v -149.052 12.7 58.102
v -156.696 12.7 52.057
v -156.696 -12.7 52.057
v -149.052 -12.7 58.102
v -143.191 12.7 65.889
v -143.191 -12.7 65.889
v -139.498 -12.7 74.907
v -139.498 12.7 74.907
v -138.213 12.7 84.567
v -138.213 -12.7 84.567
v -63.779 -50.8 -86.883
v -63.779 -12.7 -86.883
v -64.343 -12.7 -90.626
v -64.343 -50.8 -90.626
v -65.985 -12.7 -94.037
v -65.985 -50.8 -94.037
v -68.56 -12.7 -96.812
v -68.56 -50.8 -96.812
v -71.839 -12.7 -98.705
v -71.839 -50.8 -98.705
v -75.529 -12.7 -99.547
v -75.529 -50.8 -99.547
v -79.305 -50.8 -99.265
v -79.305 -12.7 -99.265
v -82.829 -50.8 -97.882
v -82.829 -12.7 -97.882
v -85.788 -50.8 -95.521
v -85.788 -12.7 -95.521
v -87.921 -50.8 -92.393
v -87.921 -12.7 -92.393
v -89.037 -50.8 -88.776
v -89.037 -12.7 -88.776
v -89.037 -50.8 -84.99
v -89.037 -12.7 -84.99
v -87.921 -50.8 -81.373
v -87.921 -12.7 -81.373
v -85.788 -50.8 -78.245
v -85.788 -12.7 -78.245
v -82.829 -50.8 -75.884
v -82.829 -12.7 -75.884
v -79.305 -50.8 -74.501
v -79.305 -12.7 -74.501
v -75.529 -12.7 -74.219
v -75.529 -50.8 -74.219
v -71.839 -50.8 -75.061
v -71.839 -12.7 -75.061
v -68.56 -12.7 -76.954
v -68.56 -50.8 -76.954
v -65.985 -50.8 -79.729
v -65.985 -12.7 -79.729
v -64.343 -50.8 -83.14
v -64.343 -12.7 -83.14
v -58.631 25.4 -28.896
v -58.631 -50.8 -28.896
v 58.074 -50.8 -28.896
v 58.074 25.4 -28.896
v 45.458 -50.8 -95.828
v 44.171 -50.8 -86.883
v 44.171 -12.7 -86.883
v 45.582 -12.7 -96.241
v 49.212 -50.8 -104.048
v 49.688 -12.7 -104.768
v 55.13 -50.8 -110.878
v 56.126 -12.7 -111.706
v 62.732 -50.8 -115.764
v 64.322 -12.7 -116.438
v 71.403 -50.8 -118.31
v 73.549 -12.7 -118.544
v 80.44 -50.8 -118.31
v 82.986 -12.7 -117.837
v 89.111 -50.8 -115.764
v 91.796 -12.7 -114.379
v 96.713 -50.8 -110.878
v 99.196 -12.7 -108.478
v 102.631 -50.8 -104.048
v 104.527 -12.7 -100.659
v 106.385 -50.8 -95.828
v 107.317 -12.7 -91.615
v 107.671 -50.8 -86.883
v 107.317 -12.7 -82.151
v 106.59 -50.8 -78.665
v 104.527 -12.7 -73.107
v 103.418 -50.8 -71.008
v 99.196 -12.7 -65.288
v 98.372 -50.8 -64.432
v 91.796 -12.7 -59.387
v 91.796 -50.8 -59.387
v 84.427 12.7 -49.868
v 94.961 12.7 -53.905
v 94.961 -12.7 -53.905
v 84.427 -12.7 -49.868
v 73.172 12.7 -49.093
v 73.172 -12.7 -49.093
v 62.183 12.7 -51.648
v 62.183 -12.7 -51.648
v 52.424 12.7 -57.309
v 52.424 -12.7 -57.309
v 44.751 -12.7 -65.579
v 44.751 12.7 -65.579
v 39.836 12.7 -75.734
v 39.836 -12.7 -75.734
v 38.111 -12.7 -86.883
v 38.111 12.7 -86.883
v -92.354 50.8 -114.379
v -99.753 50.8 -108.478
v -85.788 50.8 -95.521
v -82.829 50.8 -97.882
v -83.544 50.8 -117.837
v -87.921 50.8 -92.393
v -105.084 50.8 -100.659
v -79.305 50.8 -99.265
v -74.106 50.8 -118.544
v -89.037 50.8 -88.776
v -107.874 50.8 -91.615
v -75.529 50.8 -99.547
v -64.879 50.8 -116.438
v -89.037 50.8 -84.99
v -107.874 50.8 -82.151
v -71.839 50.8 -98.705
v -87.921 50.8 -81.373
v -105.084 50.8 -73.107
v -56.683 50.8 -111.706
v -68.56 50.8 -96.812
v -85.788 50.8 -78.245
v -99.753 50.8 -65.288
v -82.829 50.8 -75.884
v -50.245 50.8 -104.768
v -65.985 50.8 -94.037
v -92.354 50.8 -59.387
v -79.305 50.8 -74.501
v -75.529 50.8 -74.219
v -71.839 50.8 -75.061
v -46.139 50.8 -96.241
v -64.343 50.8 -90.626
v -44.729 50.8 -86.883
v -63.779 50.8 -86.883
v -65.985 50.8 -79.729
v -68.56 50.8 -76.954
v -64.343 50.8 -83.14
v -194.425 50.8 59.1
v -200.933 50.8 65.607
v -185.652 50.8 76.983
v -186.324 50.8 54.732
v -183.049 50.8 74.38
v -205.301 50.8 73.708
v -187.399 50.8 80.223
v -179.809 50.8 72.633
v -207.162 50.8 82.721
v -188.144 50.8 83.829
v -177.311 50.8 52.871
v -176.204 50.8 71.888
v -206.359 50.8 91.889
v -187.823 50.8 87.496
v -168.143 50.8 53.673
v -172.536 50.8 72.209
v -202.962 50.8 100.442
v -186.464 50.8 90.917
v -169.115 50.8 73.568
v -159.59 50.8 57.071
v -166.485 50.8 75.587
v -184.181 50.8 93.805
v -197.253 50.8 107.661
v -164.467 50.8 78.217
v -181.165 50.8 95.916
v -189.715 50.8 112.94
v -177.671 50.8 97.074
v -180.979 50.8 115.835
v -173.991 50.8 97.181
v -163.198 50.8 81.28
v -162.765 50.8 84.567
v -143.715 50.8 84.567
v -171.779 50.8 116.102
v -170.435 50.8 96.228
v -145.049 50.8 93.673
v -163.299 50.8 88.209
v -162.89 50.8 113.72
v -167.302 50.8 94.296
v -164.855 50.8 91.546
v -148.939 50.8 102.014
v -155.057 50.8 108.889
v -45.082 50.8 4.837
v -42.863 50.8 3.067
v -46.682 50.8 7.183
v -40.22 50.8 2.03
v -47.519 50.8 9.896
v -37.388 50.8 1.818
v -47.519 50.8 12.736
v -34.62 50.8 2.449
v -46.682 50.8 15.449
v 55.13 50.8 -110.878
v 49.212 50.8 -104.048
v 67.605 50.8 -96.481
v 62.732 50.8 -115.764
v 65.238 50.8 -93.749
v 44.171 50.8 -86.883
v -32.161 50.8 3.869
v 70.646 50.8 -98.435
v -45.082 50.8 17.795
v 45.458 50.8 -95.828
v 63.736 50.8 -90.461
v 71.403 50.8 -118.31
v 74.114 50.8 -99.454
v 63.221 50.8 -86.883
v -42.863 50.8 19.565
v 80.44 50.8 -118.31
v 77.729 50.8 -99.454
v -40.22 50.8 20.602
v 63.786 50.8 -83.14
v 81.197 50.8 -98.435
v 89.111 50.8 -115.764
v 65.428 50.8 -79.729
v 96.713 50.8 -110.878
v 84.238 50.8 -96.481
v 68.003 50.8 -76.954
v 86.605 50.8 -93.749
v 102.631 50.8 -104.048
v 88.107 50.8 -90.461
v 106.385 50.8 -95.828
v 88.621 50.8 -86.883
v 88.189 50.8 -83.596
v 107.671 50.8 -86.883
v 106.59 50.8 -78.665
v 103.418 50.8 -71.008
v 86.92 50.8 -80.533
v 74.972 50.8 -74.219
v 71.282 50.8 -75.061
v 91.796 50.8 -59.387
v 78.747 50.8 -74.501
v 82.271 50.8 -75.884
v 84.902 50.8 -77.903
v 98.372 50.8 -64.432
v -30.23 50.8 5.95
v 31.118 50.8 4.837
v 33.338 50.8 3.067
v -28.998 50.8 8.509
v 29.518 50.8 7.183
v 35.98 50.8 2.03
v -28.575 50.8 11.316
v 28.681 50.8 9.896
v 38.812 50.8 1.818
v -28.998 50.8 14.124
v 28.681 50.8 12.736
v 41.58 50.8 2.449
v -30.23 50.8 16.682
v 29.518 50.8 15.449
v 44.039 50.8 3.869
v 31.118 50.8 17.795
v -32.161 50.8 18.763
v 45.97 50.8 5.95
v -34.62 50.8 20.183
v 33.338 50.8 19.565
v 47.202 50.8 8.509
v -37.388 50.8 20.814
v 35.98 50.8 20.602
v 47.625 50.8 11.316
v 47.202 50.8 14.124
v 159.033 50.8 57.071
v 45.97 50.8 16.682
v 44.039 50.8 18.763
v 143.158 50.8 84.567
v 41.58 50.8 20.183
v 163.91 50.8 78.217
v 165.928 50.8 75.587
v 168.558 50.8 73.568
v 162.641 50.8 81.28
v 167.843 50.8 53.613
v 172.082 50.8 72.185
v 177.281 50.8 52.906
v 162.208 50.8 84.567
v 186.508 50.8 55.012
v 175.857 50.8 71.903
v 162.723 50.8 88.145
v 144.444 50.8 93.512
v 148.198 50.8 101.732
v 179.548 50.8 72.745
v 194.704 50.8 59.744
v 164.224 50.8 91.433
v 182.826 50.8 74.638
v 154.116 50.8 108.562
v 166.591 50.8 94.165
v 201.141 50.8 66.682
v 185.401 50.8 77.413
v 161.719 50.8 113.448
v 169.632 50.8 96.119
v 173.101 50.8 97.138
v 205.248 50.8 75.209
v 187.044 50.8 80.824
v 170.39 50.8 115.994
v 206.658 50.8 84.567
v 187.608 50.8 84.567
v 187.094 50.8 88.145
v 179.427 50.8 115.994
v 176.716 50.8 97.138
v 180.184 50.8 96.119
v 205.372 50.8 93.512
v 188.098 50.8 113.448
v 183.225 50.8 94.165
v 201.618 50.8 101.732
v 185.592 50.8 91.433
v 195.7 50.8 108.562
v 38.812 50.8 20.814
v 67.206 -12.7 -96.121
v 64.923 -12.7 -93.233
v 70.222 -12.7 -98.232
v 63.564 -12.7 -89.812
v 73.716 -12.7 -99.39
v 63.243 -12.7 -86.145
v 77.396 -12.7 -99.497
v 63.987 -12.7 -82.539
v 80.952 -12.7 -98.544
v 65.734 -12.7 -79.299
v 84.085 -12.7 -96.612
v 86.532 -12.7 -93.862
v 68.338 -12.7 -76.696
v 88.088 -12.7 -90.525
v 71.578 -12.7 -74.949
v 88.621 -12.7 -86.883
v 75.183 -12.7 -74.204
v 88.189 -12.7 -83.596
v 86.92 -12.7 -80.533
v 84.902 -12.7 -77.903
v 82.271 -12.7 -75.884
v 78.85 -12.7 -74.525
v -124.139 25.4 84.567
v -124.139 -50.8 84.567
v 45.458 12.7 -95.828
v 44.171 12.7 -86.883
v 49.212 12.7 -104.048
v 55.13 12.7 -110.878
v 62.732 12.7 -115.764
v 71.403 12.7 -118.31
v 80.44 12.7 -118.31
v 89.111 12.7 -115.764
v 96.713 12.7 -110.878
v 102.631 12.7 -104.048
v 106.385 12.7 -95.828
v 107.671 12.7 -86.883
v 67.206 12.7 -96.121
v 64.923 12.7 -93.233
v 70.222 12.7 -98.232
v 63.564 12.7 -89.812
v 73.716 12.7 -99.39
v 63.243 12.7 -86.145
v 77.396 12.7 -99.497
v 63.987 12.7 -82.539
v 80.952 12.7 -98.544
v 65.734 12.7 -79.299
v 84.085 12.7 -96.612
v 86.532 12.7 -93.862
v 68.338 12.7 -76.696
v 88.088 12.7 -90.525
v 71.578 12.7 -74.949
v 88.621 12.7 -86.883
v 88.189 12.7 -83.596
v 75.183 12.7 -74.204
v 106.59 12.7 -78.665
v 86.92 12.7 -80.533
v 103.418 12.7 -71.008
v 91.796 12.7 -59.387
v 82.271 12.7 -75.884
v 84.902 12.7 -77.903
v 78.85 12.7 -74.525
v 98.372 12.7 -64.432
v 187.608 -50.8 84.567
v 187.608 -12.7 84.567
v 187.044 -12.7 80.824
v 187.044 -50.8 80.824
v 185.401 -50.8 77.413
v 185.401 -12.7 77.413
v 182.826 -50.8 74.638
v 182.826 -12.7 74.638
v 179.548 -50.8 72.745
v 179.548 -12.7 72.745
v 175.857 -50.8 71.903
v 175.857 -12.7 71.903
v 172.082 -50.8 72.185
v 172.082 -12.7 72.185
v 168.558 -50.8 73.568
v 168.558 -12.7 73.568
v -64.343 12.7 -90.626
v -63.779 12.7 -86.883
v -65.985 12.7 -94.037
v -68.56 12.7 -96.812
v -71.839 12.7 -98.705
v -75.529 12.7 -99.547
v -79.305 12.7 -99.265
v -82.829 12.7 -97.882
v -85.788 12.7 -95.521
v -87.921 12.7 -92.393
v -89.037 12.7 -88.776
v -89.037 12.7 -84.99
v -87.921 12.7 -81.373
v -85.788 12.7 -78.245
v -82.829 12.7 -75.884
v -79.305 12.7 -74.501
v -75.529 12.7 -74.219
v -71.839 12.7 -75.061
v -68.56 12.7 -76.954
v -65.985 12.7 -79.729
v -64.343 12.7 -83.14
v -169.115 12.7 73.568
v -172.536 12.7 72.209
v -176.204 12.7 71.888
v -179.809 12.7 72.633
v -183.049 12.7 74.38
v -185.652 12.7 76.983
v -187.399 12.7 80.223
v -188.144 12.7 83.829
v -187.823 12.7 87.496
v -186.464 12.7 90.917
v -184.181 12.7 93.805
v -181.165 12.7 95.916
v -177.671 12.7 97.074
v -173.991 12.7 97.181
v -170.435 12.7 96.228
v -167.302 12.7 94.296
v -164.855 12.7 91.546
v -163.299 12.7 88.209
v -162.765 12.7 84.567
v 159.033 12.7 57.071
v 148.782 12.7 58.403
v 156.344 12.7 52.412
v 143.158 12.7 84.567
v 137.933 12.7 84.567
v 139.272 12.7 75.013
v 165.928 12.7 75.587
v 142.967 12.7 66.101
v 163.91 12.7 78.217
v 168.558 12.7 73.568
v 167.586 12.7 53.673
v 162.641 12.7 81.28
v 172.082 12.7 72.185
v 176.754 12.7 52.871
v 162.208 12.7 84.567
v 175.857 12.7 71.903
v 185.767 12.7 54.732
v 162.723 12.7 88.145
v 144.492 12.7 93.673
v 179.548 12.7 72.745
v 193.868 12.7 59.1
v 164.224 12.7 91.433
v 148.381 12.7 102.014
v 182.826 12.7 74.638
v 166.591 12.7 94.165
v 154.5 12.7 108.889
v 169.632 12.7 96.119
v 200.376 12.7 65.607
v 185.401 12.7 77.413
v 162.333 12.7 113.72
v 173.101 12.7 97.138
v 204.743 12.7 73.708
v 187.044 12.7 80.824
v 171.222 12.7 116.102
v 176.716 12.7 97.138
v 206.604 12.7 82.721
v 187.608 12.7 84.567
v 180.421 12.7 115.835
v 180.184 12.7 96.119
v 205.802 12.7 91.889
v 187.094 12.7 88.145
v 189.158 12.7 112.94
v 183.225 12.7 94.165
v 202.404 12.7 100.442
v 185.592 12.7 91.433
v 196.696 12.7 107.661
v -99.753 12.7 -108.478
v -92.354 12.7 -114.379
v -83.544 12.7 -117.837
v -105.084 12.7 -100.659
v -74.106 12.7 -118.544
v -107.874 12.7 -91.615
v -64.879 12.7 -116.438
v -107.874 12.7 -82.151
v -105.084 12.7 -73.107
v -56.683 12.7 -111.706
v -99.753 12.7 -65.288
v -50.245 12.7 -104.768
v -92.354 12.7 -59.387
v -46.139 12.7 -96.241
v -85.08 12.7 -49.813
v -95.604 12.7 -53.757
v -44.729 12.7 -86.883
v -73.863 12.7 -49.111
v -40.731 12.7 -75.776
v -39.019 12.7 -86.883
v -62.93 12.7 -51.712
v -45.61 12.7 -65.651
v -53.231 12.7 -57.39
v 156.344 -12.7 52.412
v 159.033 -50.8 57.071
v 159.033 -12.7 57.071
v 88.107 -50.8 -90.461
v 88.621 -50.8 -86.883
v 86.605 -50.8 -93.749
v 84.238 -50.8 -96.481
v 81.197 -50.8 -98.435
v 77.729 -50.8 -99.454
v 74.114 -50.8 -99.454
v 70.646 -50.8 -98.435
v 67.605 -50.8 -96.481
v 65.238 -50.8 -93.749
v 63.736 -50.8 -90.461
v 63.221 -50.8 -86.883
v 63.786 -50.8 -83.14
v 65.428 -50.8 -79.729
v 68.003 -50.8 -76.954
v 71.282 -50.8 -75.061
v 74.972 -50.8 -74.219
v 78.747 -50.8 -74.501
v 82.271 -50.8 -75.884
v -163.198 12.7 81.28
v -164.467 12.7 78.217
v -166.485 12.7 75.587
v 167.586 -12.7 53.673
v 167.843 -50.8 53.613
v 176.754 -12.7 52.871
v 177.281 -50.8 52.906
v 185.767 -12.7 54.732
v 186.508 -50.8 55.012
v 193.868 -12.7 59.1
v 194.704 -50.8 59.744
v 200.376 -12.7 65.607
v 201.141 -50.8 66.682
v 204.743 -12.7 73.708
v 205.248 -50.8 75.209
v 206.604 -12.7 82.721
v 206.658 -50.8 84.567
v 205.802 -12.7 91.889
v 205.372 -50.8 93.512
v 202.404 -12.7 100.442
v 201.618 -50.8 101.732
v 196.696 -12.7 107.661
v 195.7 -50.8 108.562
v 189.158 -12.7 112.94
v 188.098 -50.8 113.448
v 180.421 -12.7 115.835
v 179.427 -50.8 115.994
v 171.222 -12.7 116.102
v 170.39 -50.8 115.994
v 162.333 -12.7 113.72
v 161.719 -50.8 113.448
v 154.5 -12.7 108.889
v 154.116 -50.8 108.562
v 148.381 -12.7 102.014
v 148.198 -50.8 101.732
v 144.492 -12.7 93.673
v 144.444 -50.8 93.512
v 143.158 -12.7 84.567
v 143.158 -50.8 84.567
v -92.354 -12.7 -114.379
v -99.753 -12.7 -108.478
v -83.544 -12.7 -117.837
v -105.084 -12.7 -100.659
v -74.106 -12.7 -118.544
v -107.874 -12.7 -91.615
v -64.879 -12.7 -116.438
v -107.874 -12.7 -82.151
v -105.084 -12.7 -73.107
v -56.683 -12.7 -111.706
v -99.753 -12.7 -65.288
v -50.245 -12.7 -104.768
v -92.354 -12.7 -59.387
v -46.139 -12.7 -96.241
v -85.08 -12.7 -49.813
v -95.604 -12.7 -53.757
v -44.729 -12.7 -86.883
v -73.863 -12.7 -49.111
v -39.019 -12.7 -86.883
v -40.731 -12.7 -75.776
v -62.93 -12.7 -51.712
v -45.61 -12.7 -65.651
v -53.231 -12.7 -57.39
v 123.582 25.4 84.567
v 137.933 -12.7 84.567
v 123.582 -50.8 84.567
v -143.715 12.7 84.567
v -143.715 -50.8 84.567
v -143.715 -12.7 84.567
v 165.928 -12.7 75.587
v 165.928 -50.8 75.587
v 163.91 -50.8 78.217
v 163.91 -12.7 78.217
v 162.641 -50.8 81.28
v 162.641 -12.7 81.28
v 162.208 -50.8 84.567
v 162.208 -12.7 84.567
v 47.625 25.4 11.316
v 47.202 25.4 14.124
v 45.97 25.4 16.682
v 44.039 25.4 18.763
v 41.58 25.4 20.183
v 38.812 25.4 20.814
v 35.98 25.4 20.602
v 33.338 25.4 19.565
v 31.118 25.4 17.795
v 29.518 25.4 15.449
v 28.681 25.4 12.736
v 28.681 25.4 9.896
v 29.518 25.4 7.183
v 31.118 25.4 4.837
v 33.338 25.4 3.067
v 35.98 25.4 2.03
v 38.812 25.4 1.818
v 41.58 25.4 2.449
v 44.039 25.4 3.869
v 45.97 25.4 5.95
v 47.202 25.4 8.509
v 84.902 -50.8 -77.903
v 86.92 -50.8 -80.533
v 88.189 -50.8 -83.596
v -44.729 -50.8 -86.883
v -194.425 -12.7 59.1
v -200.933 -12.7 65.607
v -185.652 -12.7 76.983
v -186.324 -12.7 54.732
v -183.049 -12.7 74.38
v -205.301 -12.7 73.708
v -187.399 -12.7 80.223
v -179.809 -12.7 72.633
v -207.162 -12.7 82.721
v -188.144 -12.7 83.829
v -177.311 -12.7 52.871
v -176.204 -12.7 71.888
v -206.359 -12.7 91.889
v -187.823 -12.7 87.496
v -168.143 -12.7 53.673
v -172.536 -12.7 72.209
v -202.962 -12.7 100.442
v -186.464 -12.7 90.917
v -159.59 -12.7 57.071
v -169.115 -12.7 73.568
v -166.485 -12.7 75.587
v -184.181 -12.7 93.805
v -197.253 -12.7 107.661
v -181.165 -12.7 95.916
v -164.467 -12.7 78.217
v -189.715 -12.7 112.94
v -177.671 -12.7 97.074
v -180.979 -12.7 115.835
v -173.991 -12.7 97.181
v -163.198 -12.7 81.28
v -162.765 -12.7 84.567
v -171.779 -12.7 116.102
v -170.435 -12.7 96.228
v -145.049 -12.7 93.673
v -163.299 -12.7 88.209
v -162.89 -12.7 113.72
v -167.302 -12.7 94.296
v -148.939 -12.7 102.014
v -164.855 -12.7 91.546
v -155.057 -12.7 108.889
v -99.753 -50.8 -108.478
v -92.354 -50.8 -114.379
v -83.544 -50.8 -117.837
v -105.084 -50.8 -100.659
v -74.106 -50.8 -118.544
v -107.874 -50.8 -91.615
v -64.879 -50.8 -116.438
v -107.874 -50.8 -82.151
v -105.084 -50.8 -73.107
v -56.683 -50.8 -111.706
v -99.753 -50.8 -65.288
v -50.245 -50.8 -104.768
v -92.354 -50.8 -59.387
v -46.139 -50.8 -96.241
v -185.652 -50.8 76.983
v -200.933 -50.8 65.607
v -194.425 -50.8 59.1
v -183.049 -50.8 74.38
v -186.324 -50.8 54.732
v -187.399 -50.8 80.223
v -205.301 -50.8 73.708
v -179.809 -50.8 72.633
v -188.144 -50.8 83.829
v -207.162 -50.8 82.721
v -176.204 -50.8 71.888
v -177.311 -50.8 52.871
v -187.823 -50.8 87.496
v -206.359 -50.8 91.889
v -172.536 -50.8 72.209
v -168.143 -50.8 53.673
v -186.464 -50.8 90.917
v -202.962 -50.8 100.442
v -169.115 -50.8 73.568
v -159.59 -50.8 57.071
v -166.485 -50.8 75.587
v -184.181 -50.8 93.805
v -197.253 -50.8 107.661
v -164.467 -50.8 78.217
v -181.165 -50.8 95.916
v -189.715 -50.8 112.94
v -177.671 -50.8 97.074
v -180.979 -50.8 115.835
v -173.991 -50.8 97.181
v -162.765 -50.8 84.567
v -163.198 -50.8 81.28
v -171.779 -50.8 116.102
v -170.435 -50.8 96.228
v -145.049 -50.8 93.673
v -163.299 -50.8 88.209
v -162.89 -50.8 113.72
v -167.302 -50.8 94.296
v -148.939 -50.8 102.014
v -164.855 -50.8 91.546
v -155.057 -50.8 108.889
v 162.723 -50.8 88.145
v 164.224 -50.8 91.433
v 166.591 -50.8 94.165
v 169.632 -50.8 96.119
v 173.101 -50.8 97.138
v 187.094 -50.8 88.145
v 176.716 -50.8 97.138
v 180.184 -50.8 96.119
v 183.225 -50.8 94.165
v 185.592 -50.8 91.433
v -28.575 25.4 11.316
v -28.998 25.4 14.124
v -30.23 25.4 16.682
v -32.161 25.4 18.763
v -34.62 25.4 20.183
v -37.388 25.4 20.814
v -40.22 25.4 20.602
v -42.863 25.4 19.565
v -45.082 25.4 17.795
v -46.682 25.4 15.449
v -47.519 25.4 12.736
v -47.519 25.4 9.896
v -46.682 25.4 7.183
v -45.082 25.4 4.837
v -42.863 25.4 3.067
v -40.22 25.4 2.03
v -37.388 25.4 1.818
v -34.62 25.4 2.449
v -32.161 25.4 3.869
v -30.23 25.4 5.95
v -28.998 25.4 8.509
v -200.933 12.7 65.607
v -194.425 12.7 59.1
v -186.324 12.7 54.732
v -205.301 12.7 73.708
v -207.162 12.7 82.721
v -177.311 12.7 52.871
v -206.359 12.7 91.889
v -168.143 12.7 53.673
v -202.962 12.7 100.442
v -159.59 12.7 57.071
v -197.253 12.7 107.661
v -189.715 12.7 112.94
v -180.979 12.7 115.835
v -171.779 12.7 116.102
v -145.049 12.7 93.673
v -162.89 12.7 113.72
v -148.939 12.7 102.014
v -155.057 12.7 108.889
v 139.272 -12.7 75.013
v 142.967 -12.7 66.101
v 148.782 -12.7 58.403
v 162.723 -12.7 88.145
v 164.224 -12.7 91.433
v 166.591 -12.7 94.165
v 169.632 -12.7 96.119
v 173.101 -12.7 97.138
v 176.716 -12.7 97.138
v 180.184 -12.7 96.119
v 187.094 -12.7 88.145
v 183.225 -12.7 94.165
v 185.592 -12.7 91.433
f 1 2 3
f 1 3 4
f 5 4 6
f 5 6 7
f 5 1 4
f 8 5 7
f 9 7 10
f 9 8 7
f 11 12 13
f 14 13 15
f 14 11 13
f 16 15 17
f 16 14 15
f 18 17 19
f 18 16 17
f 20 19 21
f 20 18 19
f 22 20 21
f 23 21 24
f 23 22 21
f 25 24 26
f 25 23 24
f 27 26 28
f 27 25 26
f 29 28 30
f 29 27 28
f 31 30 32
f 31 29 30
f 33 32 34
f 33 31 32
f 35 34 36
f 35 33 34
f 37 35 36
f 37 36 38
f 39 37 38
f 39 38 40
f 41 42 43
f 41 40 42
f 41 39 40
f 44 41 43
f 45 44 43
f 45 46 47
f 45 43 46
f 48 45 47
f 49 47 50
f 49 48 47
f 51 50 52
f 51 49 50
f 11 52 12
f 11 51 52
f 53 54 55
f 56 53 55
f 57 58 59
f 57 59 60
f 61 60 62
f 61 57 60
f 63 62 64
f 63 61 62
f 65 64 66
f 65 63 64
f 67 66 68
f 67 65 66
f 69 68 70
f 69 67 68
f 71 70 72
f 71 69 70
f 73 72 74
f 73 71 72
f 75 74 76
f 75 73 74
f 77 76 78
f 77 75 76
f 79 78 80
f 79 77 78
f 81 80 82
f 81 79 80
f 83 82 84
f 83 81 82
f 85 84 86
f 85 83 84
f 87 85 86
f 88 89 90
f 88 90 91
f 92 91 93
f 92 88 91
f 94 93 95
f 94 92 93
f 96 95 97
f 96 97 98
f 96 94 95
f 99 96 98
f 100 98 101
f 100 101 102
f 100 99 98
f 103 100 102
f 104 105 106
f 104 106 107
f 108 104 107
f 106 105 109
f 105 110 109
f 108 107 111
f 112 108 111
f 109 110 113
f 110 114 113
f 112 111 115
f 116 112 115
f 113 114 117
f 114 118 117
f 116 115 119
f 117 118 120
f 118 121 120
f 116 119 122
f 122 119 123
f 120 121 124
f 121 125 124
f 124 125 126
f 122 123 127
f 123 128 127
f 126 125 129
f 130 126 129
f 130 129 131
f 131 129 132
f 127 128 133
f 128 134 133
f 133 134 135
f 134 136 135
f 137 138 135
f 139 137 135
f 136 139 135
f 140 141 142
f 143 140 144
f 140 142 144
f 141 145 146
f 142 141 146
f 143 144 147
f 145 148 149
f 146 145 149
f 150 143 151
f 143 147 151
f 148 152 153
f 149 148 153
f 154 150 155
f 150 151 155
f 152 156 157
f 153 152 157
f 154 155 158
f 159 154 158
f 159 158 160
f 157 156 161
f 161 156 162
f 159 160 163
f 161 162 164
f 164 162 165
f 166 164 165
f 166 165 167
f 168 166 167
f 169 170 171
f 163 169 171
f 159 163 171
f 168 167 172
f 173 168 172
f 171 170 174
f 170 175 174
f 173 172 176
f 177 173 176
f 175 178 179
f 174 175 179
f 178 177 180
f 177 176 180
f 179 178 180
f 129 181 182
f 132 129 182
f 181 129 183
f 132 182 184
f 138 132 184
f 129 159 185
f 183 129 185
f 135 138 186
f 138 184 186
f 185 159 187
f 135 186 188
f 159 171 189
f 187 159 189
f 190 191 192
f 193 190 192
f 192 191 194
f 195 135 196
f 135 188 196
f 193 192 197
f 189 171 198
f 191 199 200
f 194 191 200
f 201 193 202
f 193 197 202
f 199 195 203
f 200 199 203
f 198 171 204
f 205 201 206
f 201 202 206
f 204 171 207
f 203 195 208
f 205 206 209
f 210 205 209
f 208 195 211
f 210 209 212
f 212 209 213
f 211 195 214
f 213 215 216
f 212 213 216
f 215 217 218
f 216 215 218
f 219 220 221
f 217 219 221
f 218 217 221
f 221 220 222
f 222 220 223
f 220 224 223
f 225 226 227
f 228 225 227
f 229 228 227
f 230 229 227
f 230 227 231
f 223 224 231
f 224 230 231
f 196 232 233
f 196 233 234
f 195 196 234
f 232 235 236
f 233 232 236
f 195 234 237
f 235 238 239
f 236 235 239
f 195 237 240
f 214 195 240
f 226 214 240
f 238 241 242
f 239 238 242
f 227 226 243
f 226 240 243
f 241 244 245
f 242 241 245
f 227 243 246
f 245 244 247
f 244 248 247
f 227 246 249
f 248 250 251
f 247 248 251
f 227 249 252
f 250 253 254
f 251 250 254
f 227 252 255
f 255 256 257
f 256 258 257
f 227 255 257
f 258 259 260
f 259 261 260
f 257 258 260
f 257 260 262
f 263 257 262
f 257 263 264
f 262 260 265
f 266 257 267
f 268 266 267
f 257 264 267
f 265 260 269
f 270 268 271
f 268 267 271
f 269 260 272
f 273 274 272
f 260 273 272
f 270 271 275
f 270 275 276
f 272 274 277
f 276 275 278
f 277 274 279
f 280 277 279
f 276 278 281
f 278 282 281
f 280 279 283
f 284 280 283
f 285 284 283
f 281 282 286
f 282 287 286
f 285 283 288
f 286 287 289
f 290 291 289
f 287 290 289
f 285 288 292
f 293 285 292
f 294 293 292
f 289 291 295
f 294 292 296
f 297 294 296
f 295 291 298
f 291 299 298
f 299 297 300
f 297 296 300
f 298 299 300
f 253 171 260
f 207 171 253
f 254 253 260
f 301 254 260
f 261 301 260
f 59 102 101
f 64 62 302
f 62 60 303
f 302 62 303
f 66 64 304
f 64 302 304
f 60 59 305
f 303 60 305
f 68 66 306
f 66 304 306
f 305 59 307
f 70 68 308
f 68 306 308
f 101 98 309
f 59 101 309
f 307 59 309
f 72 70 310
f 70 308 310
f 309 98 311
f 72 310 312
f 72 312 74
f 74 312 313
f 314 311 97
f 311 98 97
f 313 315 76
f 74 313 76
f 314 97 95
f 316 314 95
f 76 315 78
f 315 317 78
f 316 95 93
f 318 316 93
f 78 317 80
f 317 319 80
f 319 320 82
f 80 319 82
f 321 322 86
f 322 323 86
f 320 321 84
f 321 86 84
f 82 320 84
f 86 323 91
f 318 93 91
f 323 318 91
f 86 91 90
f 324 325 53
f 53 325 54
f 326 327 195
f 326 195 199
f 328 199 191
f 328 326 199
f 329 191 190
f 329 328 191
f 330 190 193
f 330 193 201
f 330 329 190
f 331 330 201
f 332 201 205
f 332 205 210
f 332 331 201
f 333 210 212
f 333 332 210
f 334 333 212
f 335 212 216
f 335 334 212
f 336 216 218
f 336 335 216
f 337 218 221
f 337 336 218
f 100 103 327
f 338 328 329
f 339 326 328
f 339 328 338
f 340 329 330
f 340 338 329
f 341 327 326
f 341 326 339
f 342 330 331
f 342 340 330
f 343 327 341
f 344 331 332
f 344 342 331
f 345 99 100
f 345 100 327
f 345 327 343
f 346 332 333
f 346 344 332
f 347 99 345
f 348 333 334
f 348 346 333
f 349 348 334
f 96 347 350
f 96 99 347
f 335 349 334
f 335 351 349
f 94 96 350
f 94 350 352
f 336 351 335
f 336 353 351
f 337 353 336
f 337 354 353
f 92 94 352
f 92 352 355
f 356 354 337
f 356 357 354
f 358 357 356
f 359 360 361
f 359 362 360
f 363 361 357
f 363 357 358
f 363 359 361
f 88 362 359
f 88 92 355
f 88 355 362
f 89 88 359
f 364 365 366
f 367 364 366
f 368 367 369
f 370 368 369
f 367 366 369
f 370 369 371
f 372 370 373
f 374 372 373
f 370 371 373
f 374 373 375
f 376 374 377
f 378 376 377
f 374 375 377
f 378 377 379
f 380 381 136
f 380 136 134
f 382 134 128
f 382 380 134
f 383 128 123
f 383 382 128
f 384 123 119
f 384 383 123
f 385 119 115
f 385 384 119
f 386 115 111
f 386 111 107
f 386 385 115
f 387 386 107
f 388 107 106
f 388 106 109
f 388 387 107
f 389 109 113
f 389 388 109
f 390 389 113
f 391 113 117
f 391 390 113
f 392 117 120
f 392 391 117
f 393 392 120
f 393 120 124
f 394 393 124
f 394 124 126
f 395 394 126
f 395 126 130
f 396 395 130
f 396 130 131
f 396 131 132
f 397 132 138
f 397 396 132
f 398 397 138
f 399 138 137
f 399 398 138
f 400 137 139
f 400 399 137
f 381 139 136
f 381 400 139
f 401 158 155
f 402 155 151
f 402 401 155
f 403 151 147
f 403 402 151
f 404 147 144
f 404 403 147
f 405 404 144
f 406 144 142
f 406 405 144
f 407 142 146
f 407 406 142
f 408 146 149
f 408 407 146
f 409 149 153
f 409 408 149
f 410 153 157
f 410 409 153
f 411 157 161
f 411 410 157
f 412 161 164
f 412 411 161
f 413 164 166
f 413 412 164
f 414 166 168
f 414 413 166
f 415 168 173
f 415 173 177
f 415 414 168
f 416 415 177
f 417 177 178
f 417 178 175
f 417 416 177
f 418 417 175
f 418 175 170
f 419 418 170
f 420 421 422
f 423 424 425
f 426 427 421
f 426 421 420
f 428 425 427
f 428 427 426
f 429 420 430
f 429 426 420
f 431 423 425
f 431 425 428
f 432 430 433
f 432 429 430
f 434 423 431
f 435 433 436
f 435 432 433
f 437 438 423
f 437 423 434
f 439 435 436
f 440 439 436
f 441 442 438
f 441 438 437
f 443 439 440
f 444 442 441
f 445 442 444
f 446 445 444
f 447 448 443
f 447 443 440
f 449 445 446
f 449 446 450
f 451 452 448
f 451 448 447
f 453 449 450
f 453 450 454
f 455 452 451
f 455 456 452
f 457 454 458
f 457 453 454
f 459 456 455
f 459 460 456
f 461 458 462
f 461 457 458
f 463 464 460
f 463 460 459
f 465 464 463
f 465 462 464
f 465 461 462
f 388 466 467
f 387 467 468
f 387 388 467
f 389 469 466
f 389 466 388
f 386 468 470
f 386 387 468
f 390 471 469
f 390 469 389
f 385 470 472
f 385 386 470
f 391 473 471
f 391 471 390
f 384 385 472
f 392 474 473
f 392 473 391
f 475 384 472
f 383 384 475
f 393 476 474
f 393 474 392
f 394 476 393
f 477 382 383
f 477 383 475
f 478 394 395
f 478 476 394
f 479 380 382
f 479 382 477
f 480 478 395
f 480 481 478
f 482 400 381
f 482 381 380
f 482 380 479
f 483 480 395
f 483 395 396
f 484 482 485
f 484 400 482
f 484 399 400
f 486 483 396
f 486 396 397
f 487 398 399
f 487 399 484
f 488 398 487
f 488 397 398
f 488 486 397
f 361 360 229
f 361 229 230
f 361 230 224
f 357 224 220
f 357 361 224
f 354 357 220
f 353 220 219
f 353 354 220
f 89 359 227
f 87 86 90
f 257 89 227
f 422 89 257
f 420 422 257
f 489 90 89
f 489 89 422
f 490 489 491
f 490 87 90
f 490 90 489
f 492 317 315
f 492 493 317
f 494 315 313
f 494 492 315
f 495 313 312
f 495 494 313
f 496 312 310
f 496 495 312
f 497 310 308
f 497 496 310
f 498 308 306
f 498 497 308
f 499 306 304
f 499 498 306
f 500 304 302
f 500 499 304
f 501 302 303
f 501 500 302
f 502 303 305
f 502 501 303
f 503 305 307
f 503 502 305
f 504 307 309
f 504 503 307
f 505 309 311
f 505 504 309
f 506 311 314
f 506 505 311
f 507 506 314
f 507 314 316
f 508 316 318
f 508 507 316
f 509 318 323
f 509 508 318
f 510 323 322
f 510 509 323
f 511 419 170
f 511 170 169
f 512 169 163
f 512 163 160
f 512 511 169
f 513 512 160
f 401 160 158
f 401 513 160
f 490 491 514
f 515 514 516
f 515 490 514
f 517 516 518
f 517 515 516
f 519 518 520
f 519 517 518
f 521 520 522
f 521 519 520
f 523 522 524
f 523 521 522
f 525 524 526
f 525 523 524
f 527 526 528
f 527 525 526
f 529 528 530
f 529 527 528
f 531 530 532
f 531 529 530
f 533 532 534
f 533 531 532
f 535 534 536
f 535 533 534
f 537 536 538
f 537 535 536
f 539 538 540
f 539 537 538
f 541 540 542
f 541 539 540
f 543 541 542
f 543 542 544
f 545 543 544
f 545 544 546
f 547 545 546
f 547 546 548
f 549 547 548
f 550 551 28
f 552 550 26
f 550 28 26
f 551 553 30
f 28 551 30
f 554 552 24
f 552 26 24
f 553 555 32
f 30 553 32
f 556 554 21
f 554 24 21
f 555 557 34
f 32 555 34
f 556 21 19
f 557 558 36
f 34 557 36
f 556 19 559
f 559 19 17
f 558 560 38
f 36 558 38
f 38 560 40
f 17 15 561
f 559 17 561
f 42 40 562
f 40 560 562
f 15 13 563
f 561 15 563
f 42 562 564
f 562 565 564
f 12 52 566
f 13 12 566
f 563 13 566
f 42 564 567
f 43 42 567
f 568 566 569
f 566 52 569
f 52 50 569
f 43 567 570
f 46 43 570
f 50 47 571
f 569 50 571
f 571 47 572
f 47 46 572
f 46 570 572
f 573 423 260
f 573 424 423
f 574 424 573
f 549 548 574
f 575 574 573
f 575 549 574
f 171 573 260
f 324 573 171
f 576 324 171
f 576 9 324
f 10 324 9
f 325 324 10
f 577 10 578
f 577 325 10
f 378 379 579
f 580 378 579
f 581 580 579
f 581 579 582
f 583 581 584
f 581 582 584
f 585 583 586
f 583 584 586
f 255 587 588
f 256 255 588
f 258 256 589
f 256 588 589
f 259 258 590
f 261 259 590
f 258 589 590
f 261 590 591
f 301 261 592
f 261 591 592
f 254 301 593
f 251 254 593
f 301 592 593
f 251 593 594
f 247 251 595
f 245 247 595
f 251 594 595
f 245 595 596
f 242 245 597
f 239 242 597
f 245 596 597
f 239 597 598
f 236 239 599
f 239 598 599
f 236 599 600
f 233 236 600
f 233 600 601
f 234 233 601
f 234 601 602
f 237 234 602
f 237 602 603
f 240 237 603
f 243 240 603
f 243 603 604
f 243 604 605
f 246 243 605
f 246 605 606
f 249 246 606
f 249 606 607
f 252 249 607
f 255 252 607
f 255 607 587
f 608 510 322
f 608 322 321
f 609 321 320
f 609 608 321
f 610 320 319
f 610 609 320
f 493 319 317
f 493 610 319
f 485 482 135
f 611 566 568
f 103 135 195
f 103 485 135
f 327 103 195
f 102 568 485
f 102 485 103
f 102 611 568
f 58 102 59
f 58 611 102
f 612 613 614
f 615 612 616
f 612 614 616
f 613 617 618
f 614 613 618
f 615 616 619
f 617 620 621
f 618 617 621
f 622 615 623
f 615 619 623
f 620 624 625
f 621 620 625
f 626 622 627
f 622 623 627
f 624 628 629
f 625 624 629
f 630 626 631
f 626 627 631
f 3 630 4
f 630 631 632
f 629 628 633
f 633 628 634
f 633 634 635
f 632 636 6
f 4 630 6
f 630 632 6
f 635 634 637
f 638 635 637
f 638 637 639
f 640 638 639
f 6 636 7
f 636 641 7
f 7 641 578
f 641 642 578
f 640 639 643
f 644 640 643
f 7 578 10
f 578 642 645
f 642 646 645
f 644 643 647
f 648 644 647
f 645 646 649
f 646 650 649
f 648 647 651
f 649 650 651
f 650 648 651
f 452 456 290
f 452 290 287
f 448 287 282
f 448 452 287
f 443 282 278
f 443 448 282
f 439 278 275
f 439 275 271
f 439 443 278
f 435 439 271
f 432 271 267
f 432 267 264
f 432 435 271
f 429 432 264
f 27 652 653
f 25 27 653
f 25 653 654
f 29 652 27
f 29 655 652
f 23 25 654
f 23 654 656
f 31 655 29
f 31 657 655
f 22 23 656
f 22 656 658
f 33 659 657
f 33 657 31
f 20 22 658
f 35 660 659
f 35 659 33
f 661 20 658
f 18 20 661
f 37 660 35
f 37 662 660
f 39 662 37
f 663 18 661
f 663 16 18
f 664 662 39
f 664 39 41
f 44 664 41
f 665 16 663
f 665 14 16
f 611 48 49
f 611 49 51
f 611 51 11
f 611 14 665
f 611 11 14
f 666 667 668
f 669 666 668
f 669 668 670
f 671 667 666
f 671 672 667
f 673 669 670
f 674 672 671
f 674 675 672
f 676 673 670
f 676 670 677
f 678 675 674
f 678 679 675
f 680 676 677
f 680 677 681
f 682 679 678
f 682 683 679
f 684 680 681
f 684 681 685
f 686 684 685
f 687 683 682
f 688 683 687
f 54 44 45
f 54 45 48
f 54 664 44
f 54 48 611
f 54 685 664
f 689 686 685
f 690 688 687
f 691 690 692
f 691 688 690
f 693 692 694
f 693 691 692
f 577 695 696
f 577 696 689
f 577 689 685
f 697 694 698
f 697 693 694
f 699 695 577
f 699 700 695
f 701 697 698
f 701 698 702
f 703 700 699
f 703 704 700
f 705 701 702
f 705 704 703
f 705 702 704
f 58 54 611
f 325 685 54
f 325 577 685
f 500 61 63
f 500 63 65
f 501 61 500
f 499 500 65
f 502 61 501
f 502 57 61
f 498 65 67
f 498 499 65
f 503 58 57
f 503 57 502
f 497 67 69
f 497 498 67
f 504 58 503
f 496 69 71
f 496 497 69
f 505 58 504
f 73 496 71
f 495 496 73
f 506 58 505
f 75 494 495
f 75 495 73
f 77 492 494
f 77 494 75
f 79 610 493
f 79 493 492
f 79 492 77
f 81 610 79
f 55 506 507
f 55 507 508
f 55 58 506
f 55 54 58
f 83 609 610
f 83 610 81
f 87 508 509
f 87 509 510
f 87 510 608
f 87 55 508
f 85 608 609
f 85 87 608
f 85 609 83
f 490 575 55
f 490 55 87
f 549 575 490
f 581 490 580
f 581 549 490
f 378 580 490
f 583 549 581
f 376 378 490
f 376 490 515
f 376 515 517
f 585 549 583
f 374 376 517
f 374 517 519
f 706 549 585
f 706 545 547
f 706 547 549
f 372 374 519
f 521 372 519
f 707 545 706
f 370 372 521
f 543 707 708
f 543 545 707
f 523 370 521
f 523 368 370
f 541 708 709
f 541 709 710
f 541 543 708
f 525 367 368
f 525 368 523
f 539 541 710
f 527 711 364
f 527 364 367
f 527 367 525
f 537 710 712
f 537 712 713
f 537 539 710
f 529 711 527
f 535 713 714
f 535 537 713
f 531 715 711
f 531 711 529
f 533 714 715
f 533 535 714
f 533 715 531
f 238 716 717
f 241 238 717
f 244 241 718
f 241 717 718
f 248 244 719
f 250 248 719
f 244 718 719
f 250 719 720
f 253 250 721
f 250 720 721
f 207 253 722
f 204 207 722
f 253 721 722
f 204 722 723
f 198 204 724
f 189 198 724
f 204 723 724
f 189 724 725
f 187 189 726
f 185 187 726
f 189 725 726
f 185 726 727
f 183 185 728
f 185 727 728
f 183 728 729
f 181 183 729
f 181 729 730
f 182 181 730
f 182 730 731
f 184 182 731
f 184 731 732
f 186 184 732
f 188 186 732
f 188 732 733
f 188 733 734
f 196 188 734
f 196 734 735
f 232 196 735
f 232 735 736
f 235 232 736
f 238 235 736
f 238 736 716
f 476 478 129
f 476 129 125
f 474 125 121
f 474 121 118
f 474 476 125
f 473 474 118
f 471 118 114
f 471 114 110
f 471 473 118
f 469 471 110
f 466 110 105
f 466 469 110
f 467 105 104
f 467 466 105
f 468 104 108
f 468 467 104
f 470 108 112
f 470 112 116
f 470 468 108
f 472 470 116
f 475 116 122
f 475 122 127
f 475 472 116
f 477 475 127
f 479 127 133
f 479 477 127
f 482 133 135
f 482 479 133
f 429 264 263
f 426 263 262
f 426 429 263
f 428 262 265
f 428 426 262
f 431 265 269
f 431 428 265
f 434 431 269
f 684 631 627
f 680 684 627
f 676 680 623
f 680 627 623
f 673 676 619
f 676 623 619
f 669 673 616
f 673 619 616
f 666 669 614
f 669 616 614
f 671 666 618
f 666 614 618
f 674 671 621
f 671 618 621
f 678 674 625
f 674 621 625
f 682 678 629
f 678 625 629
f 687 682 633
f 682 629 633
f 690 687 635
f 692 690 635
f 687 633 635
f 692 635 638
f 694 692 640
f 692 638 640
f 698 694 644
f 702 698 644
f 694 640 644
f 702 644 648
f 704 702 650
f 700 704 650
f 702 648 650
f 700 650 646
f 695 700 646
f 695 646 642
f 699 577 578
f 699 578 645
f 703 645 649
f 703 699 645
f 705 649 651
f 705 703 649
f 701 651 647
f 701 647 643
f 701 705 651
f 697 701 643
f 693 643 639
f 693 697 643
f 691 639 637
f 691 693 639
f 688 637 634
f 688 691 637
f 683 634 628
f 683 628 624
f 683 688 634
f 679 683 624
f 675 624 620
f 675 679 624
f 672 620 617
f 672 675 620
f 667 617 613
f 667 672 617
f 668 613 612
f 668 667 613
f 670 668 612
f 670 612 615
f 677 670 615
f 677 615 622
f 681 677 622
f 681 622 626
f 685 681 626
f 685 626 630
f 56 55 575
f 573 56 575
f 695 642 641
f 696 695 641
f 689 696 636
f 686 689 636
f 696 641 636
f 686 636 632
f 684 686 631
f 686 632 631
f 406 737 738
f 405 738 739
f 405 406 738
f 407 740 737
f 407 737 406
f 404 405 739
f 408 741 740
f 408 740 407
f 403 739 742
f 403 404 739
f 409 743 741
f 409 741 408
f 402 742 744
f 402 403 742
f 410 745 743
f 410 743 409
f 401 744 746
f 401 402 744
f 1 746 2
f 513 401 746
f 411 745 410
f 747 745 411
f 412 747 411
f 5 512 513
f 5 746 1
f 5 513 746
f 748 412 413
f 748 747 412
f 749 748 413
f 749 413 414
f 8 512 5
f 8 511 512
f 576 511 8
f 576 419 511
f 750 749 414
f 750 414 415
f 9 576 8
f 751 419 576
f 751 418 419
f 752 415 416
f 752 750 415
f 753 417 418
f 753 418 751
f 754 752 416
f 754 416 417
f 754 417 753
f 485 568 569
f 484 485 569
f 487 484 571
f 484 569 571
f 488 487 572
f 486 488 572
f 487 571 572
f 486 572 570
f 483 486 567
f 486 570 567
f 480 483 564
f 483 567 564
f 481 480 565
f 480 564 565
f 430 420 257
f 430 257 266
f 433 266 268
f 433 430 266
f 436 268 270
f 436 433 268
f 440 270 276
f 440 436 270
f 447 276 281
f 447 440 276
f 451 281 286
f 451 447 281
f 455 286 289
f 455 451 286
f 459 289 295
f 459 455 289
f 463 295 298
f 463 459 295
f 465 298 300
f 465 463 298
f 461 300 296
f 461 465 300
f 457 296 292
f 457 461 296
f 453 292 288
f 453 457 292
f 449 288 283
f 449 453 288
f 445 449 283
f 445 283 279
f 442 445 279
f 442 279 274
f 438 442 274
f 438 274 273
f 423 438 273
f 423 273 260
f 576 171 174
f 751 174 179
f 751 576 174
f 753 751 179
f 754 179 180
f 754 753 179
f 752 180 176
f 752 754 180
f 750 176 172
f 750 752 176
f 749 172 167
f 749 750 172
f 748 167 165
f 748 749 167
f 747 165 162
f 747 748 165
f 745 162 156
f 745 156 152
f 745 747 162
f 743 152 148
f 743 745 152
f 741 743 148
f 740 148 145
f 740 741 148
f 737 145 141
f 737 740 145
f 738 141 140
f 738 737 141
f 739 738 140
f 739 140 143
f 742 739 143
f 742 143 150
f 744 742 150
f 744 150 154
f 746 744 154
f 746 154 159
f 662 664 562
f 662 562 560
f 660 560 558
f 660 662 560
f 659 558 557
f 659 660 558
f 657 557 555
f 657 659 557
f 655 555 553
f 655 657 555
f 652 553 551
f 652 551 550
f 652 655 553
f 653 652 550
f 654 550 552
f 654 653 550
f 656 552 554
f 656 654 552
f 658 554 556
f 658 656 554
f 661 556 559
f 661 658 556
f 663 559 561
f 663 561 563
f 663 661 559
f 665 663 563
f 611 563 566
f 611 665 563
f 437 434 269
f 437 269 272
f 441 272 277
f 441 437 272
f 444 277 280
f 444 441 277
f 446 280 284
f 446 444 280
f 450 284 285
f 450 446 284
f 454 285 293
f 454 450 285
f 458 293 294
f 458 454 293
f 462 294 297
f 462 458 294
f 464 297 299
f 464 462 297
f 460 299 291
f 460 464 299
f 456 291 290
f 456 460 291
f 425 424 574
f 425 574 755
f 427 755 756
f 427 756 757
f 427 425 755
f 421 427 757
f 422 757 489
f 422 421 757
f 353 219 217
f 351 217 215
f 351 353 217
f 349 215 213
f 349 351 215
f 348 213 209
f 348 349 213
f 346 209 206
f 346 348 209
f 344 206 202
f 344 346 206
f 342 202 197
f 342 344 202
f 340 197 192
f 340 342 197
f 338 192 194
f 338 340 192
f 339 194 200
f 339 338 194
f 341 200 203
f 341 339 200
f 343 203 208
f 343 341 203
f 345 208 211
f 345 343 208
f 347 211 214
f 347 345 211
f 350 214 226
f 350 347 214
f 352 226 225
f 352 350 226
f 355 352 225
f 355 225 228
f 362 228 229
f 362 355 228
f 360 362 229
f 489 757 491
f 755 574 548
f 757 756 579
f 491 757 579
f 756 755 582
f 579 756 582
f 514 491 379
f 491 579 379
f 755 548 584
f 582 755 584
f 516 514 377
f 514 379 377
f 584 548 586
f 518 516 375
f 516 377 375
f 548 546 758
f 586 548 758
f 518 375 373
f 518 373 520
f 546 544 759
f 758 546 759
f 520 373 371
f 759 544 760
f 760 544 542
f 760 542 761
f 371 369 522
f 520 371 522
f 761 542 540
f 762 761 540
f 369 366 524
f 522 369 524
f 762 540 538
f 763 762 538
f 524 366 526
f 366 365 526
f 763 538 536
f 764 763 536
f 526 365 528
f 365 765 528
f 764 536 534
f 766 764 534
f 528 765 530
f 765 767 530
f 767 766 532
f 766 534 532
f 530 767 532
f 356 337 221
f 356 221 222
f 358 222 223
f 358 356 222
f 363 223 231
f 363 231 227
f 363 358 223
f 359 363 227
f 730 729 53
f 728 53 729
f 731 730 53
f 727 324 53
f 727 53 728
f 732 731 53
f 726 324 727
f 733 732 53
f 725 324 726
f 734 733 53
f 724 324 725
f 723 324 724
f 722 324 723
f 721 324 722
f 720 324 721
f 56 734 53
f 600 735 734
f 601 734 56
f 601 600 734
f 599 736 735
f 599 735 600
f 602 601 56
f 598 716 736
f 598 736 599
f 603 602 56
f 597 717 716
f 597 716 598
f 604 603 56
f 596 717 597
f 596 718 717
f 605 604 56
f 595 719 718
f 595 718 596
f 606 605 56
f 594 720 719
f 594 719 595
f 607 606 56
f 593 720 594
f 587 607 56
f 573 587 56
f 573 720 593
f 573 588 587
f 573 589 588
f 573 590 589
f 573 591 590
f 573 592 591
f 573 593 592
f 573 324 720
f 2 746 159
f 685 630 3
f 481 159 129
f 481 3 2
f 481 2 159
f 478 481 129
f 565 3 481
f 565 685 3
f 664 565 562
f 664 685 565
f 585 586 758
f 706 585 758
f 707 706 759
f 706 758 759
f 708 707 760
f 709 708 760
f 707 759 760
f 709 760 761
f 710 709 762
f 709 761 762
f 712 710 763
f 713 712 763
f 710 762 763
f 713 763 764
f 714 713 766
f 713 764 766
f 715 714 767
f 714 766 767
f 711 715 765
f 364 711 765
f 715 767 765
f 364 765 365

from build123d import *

# Parameters (mm, degrees)
F1_DEPTH = 50.8
F3_DEPTH = 76.2
F4_R     = 38.1
F5_DEPTH = 12.7
F7_R     = 9.525
F8_DEPTH = 50.801


with BuildPart() as f1:
    # F0 (on Front) → F1 (new body, symmetric)
    with BuildSketch(Plane.XZ):
        with BuildLine():
            ThreePointArc((-92.3535701347, -59.3866830272), (-60.6035701347, -59.3866830272), (-44.7285701347, -86.8829895973))
            Line((-44.7285701347, -86.8829895973), (44.1714298653, -86.8829895973))
            ThreePointArc((44.1714298653, -86.8829895973), (60.0464298653, -59.3866830272), (91.7964298653, -59.3866830272))
            Line((91.7964298653, -59.3866830272), (159.0331335179, 57.0707038325))
            ThreePointArc((159.0331335179, 57.0707038325), (147.4118269477, 68.6920104027), (143.1581335179, 84.5670104027))
            Line((143.1581335179, 84.5670104027), (-143.7152737873, 84.5670104027))
            ThreePointArc((-143.7152737873, 84.5670104027), (-147.9689672171, 68.6920104027), (-159.5902737873, 57.0707038325))
            Line((-159.5902737873, 57.0707038325), (-92.3535701347, -59.3866830272))
        make_face()
        with BuildLine():
            ThreePointArc((-143.7152737873, 84.5670104027), (-202.9615803574, 100.4420104027), (-159.5902737873, 57.0707038325))
            Line((-159.5902737873, 57.0707038325), (-169.1152737873, 73.5684877746))
            ThreePointArc((-169.1152737873, 73.5684877746), (-186.4637964153, 90.9170104027), (-162.7652737873, 84.5670104027))
            Line((-162.7652737873, 84.5670104027), (-143.7152737873, 84.5670104027))
        make_face()
        with BuildLine():
            Line((-169.1152737873, 73.5684877746), (-159.5902737873, 57.0707038325))
            ThreePointArc((-159.5902737873, 57.0707038325), (-147.9689672171, 68.6920104027), (-143.7152737873, 84.5670104027))
            Line((-143.7152737873, 84.5670104027), (-162.7652737873, 84.5670104027))
            ThreePointArc((-162.7652737873, 84.5670104027), (-164.4667511592, 78.2170104027), (-169.1152737873, 73.5684877746))
        make_face()
        with BuildLine():
            ThreePointArc((143.1581335179, 84.5670104027), (147.4118269477, 68.6920104027), (159.0331335179, 57.0707038325))
            Line((159.0331335179, 57.0707038325), (168.5581335179, 73.5684877746))
            ThreePointArc((168.5581335179, 73.5684877746), (163.9096108898, 78.2170104027), (162.2081335179, 84.5670104027))
            Line((162.2081335179, 84.5670104027), (143.1581335179, 84.5670104027))
        make_face()
        with BuildLine():
            Line((168.5581335179, 73.5684877746), (159.0331335179, 57.0707038325))
            ThreePointArc((159.0331335179, 57.0707038325), (190.7831335179, 57.0707038325), (206.6581335179, 84.5670104027))
            ThreePointArc((206.6581335179, 84.5670104027), (174.9081335179, 116.3170104027), (143.1581335179, 84.5670104027))
            Line((143.1581335179, 84.5670104027), (162.2081335179, 84.5670104027))
            ThreePointArc((162.2081335179, 84.5670104027), (174.9081335179, 97.2670104027), (187.6081335179, 84.5670104027))
            ThreePointArc((187.6081335179, 84.5670104027), (181.2581335179, 73.5684877746), (168.5581335179, 73.5684877746))
        make_face()
        with BuildLine():
            ThreePointArc((91.7964298653, -59.3866830272), (60.0464298653, -59.3866830272), (44.1714298653, -86.8829895973))
            Line((44.1714298653, -86.8829895973), (63.2214298653, -86.8829895973))
            ThreePointArc((63.2214298653, -86.8829895973), (69.5714298653, -75.8844669693), (82.2714298653, -75.8844669693))
            Line((82.2714298653, -75.8844669693), (91.7964298653, -59.3866830272))
        make_face()
        with BuildLine():
            Line((63.2214298653, -86.8829895973), (44.1714298653, -86.8829895973))
            ThreePointArc((44.1714298653, -86.8829895973), (75.9214298653, -118.6329895973), (107.6714298653, -86.8829895973))
            ThreePointArc((107.6714298653, -86.8829895973), (103.4177364354, -71.0079895973), (91.7964298653, -59.3866830272))
            Line((91.7964298653, -59.3866830272), (82.2714298653, -75.8844669693))
            ThreePointArc((82.2714298653, -75.8844669693), (86.9199524934, -80.5329895973), (88.6214298653, -86.8829895973))
            ThreePointArc((88.6214298653, -86.8829895973), (75.9214298653, -99.5829895973), (63.2214298653, -86.8829895973))
        make_face()
        with BuildLine():
            ThreePointArc((-82.8285701347, -75.8844669693), (-70.1285701347, -75.8844669693), (-63.7785701347, -86.8829895973))
            Line((-63.7785701347, -86.8829895973), (-44.7285701347, -86.8829895973))
            ThreePointArc((-44.7285701347, -86.8829895973), (-60.6035701347, -59.3866830272), (-92.3535701347, -59.3866830272))
            Line((-92.3535701347, -59.3866830272), (-82.8285701347, -75.8844669693))
        make_face()
        with BuildLine():
            Line((-44.7285701347, -86.8829895973), (-63.7785701347, -86.8829895973))
            ThreePointArc((-63.7785701347, -86.8829895973), (-82.8285701347, -97.8815122254), (-82.8285701347, -75.8844669693))
            Line((-82.8285701347, -75.8844669693), (-92.3535701347, -59.3866830272))
            ThreePointArc((-92.3535701347, -59.3866830272), (-92.3535701347, -114.3792961675), (-44.7285701347, -86.8829895973))
        make_face()
    extrude(amount=F1_DEPTH, both=True)

    # F2 (on face) → F3 (cut)
    with BuildSketch(Plane.XZ.offset(50.8)):
        Polygon((123.5816945869, 84.5670104027), (-124.1388348563, 84.5670104027), (-58.6310365333, -28.8958245848), (58.0738962639, -28.8958245848), align=None)
    extrude(amount=-F3_DEPTH, mode=Mode.SUBTRACT)

    # F4 (on Front) → F5 (cut, symmetric)
    with BuildSketch(Plane.XZ):
        with Locations((-176.3127177301, 84.7191157899)):
            Circle(F4_R)
        with Locations((176.0305875596, 85.0320324617)):
            Circle(F4_R)
        with Locations((76.2104084713, -87.0717109253)):
            Circle(F4_R)
        with Locations((-77.118386936, -87.0717109253)):
            Circle(F4_R)
    extrude(amount=F5_DEPTH, both=True, mode=Mode.SUBTRACT)

    # F7 (on face) → F8 (cut, through all)
    with BuildSketch(Plane.XZ):
        with Locations((-38.1, 11.3160433248)):
            Circle(F7_R)
        with Locations((38.1, 11.3160433248)):
            Circle(F7_R)
    extrude(amount=-F8_DEPTH, mode=Mode.SUBTRACT)


solid = f1.part
